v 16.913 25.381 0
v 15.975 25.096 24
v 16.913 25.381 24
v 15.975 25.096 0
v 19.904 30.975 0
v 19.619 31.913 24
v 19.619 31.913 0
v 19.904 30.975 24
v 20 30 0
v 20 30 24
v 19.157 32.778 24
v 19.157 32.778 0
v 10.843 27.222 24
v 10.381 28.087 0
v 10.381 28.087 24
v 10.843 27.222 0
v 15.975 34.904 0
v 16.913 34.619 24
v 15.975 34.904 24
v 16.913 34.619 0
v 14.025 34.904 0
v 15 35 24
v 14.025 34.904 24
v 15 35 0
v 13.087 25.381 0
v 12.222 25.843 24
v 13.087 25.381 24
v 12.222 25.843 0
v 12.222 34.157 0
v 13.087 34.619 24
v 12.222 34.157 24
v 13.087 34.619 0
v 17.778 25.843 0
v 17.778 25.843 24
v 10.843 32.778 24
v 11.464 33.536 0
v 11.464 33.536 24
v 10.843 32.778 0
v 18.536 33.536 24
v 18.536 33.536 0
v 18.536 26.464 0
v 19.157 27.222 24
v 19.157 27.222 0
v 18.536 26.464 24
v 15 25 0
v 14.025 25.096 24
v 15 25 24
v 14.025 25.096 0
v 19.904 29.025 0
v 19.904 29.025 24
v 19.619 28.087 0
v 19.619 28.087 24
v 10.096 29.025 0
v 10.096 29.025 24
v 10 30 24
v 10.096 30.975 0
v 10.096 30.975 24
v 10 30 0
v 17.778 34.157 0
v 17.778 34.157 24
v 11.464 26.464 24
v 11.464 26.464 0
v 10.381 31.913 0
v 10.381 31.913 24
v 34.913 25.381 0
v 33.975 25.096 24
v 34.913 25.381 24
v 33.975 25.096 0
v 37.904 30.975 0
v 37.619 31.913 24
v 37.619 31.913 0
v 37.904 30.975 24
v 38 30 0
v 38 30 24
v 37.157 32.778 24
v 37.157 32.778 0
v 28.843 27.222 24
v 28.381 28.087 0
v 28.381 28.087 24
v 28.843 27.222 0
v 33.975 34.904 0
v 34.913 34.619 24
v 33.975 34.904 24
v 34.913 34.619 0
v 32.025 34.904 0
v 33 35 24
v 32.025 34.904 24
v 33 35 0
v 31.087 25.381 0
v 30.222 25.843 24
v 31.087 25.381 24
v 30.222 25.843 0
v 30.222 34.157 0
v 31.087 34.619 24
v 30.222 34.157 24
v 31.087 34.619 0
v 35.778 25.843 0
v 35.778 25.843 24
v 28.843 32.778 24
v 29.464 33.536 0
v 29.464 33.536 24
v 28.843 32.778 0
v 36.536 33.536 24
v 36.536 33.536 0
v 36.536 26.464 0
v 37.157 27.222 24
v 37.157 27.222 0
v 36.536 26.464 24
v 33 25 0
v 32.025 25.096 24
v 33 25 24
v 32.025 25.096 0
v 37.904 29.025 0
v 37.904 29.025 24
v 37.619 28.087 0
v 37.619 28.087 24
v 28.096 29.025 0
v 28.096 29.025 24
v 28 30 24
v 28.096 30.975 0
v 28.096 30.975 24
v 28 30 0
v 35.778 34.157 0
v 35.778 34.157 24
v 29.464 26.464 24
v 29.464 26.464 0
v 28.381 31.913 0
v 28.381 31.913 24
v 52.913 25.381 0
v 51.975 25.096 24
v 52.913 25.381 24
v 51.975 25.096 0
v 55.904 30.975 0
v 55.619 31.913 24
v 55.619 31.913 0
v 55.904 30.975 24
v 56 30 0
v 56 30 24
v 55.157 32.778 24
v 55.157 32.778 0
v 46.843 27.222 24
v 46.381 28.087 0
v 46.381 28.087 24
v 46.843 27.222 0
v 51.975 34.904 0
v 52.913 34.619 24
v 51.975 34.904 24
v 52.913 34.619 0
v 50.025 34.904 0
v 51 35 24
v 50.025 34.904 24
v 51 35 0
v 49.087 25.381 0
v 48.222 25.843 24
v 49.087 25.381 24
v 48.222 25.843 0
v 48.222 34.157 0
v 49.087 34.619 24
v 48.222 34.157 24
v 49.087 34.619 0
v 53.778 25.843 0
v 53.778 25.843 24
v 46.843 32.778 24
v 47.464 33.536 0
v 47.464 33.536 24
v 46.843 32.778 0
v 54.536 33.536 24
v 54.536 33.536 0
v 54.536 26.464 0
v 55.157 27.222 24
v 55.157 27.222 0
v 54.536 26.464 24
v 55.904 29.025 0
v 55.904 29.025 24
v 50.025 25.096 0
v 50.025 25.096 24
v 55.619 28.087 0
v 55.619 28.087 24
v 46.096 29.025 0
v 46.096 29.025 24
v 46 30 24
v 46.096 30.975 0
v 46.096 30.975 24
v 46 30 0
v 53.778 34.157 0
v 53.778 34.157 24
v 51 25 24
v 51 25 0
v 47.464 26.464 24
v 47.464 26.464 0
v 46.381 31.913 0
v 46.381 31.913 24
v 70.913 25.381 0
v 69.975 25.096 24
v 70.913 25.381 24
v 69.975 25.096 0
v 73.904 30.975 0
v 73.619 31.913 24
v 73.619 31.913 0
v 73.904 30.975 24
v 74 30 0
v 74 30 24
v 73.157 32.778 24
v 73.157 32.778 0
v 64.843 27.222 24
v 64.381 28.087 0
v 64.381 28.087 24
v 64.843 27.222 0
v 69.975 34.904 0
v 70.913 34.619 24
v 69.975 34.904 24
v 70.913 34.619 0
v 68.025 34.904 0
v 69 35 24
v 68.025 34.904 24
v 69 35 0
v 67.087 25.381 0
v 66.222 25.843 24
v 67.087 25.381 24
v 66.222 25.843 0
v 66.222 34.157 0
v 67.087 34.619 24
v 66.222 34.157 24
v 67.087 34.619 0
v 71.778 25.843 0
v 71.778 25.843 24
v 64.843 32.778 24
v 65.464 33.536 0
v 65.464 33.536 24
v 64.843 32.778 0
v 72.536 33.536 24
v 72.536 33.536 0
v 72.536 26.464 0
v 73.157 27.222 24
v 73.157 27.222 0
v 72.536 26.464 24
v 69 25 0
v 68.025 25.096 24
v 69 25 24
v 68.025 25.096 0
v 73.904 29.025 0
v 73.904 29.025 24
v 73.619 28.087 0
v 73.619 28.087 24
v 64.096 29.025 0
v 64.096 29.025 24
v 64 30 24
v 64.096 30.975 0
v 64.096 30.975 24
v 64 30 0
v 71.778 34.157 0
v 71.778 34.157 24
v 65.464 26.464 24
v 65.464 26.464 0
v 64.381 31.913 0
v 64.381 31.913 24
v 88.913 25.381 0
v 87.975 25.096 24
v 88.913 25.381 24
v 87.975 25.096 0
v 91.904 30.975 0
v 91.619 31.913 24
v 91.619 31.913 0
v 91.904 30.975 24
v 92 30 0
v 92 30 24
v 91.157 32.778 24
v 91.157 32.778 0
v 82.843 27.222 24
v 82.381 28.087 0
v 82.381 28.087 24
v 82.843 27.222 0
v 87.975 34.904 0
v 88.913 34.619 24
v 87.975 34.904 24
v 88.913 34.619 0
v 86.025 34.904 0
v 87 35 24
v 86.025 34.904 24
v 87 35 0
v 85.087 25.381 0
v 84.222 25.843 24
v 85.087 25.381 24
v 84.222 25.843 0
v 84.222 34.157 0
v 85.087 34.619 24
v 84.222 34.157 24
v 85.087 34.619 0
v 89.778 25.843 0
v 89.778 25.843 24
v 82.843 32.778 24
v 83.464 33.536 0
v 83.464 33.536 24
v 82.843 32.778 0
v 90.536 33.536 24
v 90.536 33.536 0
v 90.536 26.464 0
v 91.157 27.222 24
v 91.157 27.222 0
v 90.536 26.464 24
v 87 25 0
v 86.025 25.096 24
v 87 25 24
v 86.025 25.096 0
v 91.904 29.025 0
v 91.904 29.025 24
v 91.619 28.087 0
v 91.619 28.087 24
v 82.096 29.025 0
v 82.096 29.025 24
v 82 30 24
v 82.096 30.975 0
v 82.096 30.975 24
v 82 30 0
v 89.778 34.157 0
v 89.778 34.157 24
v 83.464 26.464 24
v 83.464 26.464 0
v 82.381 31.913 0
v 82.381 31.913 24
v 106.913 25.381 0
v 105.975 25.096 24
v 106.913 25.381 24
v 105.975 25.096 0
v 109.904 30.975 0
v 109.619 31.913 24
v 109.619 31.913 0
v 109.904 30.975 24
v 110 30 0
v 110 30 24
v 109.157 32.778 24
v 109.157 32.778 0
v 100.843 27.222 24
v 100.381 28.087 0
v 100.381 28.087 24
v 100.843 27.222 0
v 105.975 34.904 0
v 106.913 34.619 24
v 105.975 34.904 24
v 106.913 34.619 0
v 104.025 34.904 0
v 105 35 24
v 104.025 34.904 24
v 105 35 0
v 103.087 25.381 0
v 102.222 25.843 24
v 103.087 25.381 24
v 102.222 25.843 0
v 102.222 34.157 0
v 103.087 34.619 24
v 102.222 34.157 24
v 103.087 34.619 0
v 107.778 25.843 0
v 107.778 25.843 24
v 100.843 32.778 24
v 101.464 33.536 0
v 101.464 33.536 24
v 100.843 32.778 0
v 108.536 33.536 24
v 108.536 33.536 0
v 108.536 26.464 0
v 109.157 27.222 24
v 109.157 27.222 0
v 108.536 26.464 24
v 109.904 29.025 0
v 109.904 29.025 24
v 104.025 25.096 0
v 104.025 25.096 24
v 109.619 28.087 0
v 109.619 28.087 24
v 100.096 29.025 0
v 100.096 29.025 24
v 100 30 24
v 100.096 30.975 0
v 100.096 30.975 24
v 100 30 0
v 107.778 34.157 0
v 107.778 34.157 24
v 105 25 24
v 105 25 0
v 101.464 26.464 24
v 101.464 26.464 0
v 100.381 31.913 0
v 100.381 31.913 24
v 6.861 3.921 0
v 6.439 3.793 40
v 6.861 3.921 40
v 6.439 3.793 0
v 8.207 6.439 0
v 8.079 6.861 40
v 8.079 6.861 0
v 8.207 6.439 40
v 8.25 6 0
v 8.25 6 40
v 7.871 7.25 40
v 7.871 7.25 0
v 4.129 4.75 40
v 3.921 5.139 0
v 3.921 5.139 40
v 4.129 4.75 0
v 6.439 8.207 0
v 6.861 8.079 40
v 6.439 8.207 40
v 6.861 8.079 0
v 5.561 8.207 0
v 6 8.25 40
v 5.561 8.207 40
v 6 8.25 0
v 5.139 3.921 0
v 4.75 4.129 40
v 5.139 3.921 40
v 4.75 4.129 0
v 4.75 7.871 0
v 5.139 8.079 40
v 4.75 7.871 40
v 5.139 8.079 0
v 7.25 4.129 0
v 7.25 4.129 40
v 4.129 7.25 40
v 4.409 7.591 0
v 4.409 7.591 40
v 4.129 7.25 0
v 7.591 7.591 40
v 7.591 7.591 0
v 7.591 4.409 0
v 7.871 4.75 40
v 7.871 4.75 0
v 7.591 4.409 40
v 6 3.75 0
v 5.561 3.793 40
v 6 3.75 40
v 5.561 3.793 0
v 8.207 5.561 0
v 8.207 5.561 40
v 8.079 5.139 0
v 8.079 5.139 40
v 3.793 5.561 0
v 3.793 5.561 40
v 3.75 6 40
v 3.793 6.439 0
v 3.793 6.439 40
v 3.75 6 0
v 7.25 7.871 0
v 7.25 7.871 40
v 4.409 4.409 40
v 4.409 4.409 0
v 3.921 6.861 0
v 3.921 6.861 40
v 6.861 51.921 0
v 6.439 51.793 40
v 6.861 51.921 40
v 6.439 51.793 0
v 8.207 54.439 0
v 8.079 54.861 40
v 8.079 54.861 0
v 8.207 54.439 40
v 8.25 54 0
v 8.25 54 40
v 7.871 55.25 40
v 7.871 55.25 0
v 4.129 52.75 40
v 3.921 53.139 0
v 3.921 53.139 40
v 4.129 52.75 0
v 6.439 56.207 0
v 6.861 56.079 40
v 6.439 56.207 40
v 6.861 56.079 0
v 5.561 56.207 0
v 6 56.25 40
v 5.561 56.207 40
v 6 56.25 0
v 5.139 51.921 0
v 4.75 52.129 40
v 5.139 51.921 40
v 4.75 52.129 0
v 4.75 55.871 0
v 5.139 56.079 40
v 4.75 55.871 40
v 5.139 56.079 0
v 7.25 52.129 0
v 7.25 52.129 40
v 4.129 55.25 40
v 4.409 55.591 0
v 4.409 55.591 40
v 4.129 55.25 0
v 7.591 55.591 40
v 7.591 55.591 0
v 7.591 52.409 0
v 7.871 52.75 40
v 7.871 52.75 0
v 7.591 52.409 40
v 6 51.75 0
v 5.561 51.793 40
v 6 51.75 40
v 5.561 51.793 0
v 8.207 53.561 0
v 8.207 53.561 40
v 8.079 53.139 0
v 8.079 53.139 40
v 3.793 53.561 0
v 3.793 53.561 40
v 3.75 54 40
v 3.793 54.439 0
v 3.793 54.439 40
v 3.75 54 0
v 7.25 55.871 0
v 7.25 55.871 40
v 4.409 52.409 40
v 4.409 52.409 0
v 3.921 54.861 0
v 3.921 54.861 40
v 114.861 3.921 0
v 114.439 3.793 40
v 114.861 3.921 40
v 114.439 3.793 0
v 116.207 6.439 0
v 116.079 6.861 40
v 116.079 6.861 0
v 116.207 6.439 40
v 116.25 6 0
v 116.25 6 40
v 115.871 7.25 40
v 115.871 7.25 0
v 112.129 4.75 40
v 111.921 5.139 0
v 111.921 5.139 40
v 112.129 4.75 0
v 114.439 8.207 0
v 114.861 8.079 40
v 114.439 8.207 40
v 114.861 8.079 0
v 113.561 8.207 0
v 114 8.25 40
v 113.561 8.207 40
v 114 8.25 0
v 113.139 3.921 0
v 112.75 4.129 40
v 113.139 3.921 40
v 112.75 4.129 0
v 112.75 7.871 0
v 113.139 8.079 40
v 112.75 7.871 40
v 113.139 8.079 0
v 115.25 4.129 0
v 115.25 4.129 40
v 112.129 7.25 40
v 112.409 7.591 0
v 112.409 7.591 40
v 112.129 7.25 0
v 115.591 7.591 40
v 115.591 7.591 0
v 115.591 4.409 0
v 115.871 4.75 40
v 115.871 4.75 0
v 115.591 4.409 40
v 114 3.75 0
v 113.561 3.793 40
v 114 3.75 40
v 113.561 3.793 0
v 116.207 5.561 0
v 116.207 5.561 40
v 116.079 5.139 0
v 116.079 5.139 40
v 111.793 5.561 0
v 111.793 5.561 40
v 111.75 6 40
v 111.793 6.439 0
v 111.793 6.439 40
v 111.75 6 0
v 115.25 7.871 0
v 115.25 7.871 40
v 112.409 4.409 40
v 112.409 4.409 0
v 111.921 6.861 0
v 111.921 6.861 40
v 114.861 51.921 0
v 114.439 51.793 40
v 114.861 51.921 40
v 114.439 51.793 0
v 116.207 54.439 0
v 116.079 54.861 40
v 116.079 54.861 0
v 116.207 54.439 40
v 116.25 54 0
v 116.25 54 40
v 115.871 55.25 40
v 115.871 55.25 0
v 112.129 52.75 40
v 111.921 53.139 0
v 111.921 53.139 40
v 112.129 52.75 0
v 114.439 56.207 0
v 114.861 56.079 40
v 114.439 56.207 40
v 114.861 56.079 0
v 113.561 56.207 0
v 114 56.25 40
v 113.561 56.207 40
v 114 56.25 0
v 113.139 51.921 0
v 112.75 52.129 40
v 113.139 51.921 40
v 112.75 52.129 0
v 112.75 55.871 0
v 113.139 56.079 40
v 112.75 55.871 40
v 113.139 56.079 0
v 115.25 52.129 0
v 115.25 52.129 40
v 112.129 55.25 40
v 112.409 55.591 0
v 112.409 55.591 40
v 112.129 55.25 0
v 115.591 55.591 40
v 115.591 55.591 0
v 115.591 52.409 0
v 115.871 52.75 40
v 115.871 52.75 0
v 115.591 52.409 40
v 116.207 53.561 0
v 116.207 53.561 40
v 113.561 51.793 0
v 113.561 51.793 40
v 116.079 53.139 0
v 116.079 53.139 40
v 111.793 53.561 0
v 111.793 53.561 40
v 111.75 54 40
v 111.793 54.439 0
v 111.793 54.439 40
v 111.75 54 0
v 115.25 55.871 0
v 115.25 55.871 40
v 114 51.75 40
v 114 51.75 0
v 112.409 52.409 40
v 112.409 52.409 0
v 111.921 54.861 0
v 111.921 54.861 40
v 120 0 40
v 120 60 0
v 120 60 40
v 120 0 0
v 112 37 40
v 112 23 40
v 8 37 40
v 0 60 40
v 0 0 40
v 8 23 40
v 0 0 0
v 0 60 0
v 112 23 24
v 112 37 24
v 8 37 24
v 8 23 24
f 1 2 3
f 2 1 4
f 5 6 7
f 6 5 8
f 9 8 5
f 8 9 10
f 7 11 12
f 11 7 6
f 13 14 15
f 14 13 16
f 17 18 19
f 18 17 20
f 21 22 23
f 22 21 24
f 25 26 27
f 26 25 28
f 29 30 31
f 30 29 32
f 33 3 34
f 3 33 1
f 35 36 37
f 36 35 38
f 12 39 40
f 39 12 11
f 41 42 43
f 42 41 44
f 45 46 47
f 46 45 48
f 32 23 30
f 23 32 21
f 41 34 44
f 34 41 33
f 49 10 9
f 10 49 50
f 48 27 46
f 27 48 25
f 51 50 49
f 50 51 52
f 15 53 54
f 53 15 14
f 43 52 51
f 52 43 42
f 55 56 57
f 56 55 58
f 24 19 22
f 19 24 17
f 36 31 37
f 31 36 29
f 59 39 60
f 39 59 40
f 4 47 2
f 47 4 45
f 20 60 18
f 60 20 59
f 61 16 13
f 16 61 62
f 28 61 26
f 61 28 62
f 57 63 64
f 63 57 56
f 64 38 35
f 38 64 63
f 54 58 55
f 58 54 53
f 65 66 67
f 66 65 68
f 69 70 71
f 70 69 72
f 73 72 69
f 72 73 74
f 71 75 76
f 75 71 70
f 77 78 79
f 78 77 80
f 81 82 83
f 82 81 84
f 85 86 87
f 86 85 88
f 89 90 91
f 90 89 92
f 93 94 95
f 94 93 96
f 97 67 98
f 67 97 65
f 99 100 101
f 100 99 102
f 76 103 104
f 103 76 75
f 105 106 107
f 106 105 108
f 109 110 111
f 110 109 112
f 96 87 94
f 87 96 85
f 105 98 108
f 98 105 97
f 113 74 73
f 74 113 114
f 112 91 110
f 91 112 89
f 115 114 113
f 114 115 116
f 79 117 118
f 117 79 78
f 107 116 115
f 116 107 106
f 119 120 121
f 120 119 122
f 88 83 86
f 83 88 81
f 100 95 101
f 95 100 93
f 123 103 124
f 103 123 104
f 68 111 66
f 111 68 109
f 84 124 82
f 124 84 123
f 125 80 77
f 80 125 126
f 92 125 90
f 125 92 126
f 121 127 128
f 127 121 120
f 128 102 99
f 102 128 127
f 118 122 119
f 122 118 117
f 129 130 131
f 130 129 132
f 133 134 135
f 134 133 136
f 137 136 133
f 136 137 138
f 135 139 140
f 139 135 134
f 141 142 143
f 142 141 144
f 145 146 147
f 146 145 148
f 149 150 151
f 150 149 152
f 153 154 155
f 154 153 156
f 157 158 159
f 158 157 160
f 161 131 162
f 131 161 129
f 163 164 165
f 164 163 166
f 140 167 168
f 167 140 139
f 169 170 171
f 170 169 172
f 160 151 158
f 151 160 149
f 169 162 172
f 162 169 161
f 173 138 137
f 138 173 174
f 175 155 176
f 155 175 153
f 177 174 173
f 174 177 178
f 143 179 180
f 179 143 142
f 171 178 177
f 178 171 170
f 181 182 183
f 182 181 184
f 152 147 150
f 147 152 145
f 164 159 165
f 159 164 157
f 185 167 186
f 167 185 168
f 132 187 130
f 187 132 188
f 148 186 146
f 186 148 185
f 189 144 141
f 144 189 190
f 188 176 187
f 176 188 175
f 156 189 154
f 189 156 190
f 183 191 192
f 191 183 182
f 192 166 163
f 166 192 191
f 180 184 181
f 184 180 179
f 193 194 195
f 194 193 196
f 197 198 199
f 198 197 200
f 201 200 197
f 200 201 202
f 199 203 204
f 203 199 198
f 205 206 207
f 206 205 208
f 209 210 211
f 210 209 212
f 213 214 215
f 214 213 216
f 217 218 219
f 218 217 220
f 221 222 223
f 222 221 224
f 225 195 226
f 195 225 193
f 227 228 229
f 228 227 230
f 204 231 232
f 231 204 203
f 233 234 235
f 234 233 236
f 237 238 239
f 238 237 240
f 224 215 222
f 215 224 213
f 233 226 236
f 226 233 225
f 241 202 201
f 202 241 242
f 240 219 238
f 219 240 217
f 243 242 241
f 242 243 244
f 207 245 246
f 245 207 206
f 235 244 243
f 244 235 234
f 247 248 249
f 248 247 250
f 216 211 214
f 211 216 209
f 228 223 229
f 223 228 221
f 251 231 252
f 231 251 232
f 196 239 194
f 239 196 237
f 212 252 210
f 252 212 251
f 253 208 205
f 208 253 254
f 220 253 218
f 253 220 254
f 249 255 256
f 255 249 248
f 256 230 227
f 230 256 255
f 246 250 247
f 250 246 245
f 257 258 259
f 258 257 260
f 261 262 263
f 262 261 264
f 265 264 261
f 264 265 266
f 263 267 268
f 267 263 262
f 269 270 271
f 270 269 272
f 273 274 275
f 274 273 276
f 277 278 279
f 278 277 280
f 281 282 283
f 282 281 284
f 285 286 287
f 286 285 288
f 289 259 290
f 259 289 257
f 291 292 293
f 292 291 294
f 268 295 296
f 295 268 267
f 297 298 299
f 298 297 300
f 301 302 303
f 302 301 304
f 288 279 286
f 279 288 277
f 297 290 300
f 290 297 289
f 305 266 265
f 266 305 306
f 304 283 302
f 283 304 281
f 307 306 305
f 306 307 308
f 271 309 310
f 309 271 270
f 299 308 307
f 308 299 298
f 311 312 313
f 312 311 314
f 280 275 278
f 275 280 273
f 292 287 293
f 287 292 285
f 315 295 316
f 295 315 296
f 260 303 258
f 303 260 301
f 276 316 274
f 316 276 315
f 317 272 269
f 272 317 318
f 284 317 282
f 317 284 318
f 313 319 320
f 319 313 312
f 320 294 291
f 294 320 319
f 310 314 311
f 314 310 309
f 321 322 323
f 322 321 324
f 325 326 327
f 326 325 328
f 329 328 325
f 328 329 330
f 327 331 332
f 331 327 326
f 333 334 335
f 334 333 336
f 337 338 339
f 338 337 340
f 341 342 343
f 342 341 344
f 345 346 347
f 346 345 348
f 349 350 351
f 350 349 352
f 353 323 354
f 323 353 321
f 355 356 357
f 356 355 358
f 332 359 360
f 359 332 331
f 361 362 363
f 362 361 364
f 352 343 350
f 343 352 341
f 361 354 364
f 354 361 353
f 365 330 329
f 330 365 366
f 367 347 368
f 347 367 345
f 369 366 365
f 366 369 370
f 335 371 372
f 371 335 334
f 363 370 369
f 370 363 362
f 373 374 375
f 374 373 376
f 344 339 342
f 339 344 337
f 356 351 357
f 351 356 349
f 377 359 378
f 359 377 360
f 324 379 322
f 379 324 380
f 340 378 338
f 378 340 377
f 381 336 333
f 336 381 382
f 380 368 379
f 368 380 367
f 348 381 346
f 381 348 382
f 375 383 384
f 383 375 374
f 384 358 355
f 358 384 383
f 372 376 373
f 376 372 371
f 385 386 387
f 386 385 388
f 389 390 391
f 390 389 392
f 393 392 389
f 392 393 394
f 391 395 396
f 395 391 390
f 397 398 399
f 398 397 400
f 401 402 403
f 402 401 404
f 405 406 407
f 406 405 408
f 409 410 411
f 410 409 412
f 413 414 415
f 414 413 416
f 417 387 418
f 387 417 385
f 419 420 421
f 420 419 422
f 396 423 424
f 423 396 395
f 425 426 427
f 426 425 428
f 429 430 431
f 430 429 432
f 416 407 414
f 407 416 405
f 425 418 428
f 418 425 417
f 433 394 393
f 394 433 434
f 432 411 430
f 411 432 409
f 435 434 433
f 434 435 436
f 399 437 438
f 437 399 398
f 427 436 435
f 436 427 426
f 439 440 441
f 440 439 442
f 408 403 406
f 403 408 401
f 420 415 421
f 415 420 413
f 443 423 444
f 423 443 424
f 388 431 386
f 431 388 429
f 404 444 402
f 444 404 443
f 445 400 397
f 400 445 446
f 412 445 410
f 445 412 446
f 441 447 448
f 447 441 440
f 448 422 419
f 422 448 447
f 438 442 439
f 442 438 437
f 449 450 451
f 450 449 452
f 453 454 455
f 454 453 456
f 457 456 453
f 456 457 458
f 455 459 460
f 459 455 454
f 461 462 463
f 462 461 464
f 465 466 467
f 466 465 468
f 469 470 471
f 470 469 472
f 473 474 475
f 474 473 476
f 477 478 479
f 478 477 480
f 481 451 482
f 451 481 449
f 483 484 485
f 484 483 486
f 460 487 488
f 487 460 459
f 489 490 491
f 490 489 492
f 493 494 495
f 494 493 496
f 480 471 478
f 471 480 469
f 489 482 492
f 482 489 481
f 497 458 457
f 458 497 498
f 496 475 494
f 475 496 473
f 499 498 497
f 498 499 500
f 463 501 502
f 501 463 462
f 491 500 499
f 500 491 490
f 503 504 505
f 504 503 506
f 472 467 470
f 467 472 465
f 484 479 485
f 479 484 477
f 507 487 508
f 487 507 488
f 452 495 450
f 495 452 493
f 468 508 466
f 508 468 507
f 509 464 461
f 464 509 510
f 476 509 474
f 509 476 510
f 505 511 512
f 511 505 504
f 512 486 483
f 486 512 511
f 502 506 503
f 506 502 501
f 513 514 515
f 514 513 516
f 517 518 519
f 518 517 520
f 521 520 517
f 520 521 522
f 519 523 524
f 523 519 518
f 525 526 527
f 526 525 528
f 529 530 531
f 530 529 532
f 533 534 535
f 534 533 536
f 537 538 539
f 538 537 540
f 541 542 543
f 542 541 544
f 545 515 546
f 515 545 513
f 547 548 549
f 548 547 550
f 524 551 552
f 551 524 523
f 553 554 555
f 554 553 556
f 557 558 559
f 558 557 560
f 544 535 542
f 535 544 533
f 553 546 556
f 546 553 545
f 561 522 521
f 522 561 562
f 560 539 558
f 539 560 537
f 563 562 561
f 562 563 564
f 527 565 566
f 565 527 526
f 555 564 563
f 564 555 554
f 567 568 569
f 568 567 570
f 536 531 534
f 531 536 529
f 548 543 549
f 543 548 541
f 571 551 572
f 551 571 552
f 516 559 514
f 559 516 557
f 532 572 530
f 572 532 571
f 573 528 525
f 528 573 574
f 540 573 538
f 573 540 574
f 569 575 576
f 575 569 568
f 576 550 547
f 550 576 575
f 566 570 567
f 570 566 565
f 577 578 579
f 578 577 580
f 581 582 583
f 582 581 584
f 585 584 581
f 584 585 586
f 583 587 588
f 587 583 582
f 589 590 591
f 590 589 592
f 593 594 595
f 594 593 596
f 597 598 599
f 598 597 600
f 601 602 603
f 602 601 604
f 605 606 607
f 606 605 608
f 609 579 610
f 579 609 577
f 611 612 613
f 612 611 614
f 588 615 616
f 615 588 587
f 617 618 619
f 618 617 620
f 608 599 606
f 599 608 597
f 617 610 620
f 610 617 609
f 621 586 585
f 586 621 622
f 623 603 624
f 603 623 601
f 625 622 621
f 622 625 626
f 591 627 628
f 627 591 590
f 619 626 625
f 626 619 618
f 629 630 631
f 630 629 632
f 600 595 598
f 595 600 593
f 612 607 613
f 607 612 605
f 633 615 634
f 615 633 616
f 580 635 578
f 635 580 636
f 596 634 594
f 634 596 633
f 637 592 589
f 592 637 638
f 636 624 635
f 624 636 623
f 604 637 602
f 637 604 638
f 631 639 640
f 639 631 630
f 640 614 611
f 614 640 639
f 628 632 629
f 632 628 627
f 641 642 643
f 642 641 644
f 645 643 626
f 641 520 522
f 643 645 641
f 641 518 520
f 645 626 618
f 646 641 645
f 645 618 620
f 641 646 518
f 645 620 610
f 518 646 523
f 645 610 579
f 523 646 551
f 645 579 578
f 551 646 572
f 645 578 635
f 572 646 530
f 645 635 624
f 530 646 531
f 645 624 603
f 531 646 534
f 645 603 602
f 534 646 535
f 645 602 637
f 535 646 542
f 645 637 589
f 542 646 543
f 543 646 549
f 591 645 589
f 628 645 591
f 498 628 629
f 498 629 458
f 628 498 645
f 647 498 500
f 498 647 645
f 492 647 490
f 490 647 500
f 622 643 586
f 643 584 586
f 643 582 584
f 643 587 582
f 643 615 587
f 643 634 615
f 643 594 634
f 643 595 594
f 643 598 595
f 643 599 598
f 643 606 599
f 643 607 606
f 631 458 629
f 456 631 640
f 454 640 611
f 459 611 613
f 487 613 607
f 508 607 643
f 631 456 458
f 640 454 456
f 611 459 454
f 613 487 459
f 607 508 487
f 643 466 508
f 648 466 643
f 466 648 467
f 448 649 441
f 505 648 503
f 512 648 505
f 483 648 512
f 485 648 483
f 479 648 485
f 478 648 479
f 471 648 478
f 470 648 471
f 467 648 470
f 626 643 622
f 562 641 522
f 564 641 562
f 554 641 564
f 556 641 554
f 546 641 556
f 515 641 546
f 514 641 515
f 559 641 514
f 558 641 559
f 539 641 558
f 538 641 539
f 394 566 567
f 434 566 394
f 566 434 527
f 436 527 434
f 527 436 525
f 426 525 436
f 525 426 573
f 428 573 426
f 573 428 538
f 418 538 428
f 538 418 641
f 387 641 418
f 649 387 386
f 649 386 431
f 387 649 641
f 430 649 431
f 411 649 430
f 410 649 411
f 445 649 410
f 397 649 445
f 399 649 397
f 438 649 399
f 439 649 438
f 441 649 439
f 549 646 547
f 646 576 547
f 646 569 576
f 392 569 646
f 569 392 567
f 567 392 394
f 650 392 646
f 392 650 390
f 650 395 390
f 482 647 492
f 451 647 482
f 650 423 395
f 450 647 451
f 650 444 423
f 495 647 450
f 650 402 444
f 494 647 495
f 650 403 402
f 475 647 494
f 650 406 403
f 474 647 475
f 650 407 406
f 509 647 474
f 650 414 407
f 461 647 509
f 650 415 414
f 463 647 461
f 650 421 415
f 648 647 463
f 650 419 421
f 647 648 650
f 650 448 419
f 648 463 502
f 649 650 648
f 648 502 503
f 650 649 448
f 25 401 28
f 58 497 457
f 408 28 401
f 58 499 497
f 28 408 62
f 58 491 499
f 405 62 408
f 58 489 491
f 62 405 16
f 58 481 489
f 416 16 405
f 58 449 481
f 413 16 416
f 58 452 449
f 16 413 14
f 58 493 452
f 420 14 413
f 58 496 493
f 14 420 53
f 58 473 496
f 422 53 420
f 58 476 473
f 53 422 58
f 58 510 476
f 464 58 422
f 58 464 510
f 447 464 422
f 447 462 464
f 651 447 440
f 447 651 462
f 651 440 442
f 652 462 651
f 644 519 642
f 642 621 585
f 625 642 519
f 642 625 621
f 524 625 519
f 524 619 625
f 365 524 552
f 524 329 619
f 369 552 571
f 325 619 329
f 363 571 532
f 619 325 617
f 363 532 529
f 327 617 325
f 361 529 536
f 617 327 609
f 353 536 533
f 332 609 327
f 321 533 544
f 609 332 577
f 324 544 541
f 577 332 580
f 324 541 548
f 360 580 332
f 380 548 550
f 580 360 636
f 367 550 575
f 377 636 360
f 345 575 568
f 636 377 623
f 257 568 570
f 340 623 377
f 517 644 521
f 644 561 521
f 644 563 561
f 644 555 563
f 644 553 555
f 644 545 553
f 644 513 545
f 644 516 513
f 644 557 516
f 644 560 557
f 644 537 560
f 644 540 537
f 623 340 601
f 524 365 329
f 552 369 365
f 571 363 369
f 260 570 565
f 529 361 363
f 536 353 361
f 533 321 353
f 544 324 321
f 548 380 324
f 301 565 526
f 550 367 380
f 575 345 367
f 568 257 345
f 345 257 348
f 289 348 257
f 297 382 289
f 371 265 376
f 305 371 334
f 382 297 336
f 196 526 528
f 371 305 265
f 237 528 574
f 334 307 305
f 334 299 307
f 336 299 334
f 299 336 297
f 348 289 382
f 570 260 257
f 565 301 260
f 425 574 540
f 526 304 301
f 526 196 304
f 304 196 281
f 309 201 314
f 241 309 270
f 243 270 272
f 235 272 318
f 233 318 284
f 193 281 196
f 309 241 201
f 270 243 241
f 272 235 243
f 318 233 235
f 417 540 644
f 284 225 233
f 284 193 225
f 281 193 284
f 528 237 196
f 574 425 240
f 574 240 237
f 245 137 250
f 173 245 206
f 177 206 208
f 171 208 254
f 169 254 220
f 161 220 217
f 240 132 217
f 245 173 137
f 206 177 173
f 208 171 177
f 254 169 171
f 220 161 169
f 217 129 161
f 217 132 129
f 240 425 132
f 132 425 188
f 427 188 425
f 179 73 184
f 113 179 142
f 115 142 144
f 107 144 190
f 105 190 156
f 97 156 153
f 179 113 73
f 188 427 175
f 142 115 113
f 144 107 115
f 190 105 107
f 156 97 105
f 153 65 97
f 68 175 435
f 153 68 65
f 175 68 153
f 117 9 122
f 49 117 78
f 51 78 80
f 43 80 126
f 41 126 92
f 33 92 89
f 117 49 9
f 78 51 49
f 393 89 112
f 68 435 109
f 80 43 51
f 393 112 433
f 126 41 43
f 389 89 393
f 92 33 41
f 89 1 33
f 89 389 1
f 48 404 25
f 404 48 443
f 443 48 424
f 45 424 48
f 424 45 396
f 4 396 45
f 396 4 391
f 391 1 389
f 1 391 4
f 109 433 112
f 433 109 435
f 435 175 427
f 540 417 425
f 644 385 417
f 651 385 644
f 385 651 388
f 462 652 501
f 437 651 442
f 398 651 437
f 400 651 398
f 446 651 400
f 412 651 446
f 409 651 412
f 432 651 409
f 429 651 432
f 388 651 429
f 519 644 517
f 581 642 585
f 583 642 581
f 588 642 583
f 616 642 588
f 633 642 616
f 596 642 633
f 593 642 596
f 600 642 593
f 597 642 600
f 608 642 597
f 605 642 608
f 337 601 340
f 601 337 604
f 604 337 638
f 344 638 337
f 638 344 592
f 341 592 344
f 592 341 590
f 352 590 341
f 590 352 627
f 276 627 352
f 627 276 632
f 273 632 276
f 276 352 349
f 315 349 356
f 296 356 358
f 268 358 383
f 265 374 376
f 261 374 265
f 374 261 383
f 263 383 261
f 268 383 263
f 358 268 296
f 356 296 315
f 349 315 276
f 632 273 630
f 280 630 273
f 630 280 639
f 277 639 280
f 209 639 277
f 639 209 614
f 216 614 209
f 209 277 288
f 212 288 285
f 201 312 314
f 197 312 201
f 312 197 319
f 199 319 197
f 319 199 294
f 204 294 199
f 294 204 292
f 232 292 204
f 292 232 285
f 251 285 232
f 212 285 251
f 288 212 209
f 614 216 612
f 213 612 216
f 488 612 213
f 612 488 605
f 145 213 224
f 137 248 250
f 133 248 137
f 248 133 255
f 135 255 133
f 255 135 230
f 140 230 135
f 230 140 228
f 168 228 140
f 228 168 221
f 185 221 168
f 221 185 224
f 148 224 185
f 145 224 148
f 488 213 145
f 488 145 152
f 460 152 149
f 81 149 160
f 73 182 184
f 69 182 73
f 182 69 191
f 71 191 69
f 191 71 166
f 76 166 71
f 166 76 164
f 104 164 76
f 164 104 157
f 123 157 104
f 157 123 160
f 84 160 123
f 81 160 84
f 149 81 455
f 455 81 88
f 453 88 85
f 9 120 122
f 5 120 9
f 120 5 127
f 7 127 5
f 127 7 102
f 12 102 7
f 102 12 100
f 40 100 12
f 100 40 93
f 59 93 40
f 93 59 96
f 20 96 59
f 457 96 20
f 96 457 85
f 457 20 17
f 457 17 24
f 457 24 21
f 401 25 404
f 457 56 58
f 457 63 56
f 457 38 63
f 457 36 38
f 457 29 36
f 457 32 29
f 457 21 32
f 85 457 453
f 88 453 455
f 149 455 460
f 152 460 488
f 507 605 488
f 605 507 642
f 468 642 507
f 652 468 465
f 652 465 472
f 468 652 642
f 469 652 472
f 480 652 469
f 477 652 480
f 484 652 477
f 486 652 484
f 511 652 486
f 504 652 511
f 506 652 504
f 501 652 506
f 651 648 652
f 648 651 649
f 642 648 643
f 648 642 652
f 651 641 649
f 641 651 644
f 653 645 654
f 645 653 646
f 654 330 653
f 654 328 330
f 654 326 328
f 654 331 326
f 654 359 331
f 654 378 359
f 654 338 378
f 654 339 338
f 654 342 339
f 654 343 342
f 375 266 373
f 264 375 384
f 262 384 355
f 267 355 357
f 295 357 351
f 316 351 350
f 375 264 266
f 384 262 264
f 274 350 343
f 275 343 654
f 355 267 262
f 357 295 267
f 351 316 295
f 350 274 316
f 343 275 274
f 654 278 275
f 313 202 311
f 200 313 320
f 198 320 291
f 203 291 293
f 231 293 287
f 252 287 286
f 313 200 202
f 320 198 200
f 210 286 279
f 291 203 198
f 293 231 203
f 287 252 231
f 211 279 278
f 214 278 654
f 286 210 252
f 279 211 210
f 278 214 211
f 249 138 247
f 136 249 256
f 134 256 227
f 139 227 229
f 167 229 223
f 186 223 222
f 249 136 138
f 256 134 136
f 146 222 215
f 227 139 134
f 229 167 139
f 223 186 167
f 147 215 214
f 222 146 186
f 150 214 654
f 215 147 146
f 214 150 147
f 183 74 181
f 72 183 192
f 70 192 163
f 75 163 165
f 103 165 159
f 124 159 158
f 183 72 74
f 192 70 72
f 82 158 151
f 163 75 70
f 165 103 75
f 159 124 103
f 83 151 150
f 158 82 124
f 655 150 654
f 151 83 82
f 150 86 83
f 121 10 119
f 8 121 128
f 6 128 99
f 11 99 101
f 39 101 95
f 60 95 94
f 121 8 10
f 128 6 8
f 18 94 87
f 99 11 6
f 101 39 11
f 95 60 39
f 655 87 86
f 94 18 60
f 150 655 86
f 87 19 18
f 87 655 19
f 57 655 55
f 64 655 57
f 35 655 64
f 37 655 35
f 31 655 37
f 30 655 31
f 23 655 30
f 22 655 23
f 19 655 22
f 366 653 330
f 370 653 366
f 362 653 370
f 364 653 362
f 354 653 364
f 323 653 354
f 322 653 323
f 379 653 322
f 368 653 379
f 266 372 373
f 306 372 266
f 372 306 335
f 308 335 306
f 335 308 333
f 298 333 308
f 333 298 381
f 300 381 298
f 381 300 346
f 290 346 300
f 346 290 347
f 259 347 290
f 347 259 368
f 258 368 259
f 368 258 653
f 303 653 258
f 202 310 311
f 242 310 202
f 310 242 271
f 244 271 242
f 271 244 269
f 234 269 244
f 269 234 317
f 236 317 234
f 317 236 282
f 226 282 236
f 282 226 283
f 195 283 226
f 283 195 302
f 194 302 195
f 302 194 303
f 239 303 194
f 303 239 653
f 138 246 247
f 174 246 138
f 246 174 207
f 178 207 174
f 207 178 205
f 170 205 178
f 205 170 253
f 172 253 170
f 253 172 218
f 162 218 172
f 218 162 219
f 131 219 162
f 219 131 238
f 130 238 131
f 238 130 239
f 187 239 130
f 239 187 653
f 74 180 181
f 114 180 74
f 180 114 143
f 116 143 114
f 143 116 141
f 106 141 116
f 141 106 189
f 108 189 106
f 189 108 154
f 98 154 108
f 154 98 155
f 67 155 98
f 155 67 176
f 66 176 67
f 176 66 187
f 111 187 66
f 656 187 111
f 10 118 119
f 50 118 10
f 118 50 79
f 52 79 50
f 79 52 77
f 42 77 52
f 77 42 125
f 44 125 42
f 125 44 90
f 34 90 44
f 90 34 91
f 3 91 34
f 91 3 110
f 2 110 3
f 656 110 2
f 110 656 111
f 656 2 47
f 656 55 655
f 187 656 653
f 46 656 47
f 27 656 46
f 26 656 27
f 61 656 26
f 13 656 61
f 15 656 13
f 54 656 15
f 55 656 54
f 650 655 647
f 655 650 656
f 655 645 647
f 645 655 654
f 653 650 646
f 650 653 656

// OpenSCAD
$fn = 32;

// ----------------------------------------------------------------------
// Manifold block: gallery_top manifold
// ----------------------------------------------------------------------

// --- parameters (mm) ---
block_l = 120;            // block length, X
block_w = 60;             // block width, Y
block_h = 40;             // block height, Z
port_d = 10;              // port bore diameter
port_pitch = 18;          // port pitch along X
gallery_d = 14;           // top gallery width, Y
gallery_depth = 16;       // gallery pocket depth
wall_p = 8;               // gallery end wall thickness, X
mnt_d = 4.5;              // mounting hole diameter
mnt_in = 6;               // mounting hole inset from the edges

n_ports = 6;  // ports in the row
port_x0 = (block_l - (n_ports - 1) * port_pitch) / 2;  // first port X

difference() {
  cube([block_l, block_w, block_h]);
  for (i = [0 : n_ports - 1])
    translate([port_x0 + i * port_pitch, block_w / 2, -1])
      cylinder(h = block_h + 2, d = port_d);
  translate([wall_p, block_w / 2 - gallery_d / 2, block_h - gallery_depth])
    cube([block_l - 2 * wall_p, gallery_d, gallery_depth + 1]);
  for (cx = [mnt_in, block_l - mnt_in])
    for (cy = [mnt_in, block_w - mnt_in])
      translate([cx, cy, -1]) cylinder(h = block_h + 2, d = mnt_d);
}
